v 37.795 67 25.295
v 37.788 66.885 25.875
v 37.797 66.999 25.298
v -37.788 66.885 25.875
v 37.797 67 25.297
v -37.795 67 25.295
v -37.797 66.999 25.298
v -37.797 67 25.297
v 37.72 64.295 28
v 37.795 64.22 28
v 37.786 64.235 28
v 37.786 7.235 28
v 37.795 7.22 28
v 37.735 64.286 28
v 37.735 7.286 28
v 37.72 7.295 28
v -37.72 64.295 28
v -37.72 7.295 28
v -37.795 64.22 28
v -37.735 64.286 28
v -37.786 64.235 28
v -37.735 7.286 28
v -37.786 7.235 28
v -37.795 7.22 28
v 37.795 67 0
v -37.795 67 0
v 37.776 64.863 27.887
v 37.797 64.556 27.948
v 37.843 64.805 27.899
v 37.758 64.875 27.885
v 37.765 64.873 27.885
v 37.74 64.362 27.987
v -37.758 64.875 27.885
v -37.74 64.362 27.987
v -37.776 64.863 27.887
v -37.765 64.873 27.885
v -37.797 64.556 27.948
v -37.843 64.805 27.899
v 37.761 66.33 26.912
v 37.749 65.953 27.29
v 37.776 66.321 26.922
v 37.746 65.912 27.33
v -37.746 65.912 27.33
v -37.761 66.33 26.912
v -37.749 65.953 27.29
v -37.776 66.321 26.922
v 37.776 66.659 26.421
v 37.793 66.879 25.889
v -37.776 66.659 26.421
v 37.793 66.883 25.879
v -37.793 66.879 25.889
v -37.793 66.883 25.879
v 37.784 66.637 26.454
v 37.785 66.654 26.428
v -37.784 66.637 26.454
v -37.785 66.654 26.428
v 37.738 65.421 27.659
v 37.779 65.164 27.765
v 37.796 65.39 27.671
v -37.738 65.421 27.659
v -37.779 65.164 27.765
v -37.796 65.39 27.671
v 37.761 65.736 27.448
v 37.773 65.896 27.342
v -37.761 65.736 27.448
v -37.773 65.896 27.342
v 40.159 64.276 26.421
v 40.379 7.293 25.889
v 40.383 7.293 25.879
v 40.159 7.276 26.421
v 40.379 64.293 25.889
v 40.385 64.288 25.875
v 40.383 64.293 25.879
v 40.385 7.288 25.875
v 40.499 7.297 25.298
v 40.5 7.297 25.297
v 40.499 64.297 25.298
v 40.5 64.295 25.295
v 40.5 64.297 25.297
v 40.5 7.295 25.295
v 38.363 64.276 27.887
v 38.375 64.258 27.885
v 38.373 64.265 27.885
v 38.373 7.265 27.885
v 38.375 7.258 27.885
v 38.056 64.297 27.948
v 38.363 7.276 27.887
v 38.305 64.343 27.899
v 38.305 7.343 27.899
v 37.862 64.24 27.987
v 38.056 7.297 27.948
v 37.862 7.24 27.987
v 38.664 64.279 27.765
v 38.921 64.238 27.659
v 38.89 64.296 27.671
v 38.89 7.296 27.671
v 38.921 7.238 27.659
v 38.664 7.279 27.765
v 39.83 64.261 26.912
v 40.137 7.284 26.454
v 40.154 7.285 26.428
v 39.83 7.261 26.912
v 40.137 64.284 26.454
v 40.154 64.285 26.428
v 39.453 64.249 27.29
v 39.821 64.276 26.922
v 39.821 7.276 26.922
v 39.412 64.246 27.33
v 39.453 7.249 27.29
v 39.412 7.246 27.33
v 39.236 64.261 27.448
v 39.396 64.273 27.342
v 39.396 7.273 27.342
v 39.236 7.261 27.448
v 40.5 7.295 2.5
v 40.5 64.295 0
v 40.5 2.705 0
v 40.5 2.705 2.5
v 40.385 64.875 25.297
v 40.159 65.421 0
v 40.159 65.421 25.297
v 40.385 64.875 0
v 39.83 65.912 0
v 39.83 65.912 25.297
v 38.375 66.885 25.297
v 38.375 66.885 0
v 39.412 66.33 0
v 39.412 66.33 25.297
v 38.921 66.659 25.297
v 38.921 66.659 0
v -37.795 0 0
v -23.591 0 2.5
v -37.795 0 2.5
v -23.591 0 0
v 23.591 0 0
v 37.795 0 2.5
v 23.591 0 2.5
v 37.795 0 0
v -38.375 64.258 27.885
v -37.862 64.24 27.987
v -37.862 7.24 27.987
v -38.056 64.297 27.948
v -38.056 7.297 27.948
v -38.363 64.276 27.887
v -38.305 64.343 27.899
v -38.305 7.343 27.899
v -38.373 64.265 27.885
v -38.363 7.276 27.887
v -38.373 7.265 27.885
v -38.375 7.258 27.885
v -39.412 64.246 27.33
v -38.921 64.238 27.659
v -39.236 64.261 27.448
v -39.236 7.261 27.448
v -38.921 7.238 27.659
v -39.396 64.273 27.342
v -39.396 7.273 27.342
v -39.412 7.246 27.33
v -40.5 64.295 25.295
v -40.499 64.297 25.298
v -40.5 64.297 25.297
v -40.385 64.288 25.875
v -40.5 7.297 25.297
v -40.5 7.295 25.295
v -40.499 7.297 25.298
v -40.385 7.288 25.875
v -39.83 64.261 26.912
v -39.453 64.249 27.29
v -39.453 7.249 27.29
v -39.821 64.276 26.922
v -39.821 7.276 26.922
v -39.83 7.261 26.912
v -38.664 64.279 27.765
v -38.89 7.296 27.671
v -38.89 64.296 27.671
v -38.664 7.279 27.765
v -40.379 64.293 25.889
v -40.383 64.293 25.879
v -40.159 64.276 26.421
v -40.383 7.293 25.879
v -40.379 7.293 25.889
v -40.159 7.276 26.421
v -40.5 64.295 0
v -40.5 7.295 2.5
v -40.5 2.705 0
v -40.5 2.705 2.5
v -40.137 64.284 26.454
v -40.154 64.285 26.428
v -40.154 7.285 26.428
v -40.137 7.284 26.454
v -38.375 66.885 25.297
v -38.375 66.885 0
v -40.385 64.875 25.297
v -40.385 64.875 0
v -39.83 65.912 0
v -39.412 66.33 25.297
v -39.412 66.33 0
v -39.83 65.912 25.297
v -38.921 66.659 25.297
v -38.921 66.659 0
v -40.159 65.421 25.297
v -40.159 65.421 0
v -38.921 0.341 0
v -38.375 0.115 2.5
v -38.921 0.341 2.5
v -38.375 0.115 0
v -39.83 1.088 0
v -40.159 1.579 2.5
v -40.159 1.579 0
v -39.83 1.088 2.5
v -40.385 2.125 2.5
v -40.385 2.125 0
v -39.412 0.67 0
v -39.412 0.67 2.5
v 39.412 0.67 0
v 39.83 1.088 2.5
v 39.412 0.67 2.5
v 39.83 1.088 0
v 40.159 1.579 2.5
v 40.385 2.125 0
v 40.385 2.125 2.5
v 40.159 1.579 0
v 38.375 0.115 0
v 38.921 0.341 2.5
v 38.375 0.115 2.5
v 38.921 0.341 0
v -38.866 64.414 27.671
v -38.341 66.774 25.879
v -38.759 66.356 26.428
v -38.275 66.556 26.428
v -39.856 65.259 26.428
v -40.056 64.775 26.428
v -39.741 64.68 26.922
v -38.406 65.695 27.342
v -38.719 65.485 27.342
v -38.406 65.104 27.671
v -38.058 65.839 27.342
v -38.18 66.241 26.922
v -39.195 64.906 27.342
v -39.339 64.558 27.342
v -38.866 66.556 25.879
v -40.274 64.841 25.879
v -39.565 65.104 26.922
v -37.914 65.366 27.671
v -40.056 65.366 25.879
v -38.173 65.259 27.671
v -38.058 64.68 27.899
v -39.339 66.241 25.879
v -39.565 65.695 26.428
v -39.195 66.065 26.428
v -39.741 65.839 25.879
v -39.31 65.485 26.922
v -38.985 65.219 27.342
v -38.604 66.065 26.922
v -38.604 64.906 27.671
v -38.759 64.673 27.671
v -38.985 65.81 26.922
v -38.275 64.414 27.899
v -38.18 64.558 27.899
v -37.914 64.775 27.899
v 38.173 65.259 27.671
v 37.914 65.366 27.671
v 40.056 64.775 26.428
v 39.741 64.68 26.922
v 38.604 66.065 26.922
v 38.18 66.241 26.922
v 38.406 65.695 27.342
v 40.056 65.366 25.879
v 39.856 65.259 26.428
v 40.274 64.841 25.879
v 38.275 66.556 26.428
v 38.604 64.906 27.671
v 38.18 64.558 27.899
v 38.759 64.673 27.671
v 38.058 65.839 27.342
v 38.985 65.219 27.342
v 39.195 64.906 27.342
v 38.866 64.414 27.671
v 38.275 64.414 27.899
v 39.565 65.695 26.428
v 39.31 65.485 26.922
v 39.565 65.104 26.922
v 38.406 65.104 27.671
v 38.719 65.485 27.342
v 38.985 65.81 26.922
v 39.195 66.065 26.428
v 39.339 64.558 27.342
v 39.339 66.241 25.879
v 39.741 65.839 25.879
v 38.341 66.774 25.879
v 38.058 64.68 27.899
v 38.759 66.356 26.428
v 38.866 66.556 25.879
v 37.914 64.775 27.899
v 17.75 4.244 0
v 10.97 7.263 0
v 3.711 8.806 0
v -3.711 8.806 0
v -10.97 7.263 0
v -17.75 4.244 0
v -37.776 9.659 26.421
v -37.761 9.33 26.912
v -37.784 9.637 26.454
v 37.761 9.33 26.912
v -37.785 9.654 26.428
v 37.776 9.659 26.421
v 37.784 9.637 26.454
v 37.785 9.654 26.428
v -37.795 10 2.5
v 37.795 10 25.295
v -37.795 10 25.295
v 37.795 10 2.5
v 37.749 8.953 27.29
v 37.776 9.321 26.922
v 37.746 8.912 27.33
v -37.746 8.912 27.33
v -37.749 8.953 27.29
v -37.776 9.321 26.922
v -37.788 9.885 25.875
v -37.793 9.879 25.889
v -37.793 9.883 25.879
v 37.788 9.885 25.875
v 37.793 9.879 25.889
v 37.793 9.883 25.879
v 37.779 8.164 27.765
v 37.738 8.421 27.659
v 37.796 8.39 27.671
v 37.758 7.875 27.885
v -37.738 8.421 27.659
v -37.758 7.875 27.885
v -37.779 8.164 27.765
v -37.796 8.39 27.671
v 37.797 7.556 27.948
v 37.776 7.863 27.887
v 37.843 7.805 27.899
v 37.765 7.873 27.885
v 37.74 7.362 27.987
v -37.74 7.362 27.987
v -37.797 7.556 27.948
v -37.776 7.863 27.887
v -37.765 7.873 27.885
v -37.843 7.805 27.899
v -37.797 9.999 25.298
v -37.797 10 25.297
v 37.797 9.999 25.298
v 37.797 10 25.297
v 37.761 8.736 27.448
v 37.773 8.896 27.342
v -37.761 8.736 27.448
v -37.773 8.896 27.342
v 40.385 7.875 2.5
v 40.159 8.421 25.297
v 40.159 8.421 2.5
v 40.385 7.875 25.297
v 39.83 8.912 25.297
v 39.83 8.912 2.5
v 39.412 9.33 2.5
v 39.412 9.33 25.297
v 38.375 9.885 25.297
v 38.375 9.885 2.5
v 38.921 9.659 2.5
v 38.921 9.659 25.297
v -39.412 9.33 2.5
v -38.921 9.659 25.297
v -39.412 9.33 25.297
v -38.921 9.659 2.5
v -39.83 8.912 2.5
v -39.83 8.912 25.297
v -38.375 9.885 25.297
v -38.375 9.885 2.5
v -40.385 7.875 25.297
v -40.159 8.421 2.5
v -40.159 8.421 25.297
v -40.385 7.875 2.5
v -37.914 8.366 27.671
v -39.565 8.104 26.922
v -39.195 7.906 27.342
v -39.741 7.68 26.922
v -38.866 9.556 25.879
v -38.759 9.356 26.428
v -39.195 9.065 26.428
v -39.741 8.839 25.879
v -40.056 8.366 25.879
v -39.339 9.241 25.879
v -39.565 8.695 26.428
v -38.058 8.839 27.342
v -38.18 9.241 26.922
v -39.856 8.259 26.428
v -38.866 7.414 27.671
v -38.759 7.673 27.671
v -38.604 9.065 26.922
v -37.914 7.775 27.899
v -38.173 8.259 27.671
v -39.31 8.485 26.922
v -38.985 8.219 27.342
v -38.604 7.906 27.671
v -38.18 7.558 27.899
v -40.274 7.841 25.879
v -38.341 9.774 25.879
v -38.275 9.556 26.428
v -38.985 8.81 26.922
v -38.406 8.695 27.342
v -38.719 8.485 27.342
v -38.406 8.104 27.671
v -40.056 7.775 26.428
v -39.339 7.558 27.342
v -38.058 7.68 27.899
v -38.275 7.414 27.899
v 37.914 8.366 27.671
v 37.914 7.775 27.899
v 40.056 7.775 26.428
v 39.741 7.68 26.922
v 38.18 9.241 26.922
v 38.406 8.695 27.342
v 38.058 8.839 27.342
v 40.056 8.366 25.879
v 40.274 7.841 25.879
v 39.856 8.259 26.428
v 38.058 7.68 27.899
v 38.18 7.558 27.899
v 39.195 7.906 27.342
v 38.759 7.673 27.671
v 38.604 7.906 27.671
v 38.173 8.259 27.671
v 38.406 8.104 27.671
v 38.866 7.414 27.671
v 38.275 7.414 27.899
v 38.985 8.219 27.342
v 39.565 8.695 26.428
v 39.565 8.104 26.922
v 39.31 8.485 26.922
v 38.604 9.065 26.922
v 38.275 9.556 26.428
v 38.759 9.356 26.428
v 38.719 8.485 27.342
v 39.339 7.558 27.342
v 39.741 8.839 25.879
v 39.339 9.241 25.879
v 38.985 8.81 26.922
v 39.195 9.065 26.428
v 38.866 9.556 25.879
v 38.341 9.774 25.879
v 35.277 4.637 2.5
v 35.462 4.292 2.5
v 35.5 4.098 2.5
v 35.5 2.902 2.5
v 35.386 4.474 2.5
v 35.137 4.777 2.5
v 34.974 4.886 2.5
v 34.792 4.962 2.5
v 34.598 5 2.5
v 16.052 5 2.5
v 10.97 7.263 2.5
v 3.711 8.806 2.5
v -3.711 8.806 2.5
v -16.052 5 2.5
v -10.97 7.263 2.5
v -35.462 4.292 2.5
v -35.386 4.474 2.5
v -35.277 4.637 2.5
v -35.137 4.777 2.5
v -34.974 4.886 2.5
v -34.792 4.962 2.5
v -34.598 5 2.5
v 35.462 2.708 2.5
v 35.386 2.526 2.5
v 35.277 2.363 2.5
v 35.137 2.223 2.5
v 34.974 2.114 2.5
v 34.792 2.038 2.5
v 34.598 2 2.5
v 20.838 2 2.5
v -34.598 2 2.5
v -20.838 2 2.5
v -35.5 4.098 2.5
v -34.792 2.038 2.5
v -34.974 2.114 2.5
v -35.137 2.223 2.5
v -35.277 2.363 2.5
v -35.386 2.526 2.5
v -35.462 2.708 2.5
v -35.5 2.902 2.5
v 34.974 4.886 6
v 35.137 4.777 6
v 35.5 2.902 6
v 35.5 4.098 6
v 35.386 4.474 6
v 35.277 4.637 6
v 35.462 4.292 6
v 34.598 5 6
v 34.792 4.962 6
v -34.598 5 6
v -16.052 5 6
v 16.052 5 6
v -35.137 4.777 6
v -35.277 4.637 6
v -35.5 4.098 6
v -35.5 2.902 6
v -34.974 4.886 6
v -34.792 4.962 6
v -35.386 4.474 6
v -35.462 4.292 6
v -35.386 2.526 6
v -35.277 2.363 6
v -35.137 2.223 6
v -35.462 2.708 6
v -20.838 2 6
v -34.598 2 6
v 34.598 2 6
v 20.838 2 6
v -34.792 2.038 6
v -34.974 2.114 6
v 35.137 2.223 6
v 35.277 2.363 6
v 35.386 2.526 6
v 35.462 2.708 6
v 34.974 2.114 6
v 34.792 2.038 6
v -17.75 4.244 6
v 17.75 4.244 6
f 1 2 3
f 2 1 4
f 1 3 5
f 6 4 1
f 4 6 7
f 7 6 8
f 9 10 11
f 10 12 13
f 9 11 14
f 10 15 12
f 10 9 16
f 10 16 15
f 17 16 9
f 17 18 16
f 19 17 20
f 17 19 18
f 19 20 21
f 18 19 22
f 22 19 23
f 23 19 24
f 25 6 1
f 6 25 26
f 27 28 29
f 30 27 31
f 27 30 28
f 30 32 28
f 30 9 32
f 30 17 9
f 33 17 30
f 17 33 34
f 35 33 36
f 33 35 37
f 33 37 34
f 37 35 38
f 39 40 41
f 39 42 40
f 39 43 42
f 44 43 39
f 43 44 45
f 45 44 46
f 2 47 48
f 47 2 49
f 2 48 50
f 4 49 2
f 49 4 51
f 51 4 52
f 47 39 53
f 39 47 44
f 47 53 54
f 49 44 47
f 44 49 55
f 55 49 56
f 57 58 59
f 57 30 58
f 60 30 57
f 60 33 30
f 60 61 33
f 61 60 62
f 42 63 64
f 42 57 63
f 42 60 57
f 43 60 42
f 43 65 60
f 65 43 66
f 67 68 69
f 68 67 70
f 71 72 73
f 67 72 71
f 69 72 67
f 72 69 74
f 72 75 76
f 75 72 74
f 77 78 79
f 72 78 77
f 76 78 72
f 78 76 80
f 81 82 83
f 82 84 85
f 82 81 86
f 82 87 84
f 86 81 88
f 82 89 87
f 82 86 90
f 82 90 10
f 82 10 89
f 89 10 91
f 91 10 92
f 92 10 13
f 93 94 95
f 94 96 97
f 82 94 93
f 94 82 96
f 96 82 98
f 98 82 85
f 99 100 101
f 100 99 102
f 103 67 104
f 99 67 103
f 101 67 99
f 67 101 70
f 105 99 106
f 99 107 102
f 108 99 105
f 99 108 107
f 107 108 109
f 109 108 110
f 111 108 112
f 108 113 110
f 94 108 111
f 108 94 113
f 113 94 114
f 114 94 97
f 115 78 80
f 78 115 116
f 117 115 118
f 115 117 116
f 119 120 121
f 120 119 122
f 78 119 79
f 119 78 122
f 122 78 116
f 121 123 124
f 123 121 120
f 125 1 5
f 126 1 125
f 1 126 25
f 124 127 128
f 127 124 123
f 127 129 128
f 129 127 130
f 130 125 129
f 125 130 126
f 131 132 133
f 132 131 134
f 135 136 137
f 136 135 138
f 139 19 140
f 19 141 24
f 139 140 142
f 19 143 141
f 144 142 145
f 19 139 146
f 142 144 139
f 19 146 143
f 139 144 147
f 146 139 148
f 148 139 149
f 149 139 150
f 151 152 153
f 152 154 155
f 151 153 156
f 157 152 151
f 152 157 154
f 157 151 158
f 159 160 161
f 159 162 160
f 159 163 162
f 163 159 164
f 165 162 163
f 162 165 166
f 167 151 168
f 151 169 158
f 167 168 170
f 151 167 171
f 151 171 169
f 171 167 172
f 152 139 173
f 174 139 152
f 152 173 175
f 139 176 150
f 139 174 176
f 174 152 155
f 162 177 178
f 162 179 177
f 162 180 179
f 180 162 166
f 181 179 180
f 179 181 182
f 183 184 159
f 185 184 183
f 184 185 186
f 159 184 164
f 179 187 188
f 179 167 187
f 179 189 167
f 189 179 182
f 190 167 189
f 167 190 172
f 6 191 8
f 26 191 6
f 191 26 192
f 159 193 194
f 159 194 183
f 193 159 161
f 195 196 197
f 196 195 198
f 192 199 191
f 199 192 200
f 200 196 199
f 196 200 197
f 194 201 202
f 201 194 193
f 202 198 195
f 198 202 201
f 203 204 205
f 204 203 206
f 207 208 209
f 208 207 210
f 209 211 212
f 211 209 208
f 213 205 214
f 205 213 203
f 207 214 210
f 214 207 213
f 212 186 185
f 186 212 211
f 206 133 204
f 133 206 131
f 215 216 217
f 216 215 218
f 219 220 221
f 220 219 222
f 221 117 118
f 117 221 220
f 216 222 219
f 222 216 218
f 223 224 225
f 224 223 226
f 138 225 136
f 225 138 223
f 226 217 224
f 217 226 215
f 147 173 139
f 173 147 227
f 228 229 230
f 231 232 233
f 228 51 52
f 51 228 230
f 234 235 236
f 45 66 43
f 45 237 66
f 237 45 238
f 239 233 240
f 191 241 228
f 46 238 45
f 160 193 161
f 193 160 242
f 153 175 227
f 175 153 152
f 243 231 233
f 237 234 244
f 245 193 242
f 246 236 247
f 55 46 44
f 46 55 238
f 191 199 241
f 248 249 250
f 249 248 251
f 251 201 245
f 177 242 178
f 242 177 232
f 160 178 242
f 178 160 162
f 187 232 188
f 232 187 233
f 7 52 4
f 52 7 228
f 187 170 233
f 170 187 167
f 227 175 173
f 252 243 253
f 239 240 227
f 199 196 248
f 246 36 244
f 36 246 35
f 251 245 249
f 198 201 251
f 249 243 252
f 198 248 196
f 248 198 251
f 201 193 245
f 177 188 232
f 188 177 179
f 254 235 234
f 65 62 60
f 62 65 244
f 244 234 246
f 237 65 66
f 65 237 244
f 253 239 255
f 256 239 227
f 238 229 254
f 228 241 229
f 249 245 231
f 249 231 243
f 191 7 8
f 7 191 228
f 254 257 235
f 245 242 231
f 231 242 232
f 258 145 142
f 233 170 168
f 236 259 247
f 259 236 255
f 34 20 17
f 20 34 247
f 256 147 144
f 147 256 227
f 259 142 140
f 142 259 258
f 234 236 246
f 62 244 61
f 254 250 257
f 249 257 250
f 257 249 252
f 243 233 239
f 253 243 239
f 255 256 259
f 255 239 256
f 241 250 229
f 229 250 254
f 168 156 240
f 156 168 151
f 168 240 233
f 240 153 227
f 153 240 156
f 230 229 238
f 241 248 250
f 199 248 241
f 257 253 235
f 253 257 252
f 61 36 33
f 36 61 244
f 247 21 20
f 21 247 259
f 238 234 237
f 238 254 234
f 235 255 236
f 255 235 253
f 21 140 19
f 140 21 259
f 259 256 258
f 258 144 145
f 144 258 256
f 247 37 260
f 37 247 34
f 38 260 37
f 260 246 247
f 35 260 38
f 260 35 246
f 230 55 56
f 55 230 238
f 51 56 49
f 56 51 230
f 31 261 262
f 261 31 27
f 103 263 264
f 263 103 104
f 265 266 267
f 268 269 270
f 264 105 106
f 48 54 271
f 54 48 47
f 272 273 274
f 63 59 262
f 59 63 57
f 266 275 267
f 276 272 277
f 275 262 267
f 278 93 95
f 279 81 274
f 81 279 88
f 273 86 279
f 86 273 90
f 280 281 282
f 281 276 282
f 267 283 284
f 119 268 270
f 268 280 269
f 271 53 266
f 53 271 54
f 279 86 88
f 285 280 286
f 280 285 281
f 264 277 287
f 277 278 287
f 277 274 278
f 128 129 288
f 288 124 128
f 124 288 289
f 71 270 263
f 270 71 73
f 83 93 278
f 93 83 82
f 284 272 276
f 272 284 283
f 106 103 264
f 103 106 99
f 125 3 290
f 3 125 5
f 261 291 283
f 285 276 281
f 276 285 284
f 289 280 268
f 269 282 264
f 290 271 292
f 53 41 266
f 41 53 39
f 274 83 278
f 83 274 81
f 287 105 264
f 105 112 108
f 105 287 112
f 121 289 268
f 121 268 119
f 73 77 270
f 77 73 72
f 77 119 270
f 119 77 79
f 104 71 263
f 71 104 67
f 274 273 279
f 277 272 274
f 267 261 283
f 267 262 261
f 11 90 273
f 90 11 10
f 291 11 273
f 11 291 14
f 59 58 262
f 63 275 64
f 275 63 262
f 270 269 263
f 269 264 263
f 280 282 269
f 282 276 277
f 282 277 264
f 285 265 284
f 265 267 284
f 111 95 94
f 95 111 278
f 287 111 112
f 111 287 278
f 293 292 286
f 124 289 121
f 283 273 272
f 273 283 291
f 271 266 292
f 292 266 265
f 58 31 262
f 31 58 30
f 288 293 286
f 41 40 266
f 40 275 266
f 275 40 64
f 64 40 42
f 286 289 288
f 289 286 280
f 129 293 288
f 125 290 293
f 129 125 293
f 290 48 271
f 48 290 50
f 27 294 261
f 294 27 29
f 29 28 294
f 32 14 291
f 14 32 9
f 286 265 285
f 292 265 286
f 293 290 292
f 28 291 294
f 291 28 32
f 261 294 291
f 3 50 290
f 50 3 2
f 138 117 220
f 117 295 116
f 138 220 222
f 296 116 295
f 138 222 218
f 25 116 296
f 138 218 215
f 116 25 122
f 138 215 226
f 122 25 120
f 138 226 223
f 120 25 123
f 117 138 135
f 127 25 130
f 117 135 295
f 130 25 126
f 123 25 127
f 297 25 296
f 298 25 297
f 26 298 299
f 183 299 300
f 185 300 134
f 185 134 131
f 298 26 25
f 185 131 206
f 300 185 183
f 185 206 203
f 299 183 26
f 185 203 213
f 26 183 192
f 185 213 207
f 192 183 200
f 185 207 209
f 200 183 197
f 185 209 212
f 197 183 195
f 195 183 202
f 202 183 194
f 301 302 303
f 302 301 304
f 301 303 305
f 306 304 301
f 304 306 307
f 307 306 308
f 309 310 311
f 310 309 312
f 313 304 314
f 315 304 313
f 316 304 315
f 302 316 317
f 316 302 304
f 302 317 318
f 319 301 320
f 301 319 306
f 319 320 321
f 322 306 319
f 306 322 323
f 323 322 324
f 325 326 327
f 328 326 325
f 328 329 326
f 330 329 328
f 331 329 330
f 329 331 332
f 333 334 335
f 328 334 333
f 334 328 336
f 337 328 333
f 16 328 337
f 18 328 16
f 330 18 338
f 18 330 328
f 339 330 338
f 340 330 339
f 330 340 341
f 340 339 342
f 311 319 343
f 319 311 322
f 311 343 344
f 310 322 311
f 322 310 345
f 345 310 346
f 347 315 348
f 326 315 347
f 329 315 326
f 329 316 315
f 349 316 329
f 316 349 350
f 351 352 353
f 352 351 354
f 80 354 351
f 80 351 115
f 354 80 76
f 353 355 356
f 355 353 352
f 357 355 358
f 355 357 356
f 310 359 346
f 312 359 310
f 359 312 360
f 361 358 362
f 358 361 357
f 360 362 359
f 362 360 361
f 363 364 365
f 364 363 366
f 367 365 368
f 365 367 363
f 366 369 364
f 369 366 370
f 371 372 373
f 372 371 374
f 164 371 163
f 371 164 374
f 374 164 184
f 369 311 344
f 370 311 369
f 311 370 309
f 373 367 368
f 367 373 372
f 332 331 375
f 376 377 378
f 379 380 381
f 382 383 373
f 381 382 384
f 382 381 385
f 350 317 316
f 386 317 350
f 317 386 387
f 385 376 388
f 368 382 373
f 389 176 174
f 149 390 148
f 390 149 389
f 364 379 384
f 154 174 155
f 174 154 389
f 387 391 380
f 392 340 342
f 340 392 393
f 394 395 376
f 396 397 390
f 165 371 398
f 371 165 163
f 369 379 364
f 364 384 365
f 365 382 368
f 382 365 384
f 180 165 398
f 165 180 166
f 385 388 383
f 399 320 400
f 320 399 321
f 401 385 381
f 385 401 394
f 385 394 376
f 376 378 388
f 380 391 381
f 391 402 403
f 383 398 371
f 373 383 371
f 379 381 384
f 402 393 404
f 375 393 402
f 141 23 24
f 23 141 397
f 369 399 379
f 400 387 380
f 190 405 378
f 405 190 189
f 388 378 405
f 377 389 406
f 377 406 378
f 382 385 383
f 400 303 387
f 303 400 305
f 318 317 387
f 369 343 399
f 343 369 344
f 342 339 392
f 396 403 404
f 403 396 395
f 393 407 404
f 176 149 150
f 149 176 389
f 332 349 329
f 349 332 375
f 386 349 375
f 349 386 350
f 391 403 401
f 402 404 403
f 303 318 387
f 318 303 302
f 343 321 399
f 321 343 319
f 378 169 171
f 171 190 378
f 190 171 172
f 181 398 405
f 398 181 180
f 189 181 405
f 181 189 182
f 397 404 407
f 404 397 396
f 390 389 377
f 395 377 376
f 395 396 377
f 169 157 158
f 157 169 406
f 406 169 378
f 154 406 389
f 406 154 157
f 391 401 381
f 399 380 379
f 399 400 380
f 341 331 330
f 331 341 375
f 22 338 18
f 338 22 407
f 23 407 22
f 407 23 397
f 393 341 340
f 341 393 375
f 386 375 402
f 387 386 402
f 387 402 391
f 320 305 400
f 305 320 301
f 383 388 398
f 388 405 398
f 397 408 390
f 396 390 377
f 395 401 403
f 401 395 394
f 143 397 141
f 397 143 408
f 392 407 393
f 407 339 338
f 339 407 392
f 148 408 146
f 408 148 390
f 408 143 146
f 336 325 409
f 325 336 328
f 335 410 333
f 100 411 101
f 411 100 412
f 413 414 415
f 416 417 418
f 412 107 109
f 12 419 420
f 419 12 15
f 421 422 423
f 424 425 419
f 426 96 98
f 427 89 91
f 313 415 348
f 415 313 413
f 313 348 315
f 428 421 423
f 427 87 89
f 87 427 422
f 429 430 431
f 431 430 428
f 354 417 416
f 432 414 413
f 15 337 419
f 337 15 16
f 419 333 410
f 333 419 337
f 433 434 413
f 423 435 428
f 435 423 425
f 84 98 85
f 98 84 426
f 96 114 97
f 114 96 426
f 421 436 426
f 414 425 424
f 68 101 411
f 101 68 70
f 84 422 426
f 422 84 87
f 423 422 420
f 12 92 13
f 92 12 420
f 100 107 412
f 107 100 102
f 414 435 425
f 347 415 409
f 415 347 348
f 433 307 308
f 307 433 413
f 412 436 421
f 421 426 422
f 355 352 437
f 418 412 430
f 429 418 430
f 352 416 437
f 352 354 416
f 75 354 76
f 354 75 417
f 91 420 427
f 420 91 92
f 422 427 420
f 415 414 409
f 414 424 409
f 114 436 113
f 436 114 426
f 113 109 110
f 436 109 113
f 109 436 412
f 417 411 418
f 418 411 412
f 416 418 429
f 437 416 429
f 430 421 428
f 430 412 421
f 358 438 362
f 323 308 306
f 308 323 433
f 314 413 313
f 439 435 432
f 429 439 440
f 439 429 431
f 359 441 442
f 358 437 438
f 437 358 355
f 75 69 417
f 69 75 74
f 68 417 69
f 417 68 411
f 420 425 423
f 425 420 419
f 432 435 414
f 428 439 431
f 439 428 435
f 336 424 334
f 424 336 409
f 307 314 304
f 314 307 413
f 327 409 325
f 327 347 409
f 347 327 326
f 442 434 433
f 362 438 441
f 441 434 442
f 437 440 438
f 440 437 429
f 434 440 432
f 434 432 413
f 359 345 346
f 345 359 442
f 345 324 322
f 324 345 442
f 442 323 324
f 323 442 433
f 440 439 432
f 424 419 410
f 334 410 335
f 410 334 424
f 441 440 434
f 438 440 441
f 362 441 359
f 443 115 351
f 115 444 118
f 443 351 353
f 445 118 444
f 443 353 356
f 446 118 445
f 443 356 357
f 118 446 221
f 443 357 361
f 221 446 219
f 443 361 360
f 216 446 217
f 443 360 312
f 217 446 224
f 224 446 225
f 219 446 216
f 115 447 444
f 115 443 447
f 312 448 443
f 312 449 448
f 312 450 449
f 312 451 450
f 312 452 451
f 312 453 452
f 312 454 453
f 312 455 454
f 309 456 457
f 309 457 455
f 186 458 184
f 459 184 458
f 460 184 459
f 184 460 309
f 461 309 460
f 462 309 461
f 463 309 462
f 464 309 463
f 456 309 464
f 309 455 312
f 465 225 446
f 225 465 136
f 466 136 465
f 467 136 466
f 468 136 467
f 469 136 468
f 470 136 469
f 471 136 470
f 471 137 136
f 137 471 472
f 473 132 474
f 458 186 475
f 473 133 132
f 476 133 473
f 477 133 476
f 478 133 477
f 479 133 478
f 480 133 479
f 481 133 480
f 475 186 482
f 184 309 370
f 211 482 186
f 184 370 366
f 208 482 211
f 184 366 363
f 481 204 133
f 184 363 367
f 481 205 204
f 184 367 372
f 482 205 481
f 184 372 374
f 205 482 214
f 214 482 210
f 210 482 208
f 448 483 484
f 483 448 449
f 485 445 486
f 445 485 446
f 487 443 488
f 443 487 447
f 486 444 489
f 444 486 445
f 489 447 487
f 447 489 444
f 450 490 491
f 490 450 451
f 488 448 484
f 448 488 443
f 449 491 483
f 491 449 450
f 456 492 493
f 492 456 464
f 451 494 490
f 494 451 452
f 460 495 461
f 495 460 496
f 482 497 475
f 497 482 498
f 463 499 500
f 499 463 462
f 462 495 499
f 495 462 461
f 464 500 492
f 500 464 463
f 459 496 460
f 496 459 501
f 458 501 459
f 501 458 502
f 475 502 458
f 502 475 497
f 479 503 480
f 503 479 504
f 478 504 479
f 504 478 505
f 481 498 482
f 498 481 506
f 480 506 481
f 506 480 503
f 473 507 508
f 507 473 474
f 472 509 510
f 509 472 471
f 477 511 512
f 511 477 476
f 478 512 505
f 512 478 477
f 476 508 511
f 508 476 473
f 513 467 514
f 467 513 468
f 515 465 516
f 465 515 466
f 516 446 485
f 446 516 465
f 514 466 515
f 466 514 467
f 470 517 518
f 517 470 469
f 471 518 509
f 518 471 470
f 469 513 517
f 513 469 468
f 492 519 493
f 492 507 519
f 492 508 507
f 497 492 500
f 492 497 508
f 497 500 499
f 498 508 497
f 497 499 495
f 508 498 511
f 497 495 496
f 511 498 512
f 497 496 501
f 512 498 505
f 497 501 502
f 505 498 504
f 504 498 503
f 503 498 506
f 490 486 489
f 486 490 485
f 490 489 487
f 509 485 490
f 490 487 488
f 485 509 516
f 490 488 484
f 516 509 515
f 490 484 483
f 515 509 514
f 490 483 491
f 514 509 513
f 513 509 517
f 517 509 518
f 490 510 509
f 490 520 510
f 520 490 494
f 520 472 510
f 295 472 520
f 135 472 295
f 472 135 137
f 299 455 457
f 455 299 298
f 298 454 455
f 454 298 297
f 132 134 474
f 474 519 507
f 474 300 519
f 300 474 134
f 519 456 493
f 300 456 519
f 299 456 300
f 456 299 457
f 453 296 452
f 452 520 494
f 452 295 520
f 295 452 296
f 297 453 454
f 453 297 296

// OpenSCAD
include <BOSL/constants.scad>
use <BOSL/shapes.scad>
use <BOSL/transforms.scad>

w=81;
h1=2.5;
h2=28;

$fn=$preview ? 10 : 30;

module table_stopper(l) {
    difference() {
        cuboid([w, l+10, h2], align=V_TOP+V_BACK, edges=EDGES_ALL-EDGES_BOTTOM, fillet=3);
        difference() {
            zmove(h1) cuboid([w, 10, h2-h1], align=V_TOP+V_BACK, edges=EDGES_Z_BK+EDGES_TOP-EDGE_TOP_FR, fillet=3);
            ymove(2) cuboid([w-10, 3, 6], align=V_TOP+V_BACK, edges=EDGES_Z_ALL, fillet=1);
        }
        ymove(-(w/2)+14) cylinder(h=h2/2, d=w-10);
        //ymove(l/2+10) cylinder(h=h2-h1, d=l-10);
    }
   
}

//table_stopper(55);
table_stopper(57);
